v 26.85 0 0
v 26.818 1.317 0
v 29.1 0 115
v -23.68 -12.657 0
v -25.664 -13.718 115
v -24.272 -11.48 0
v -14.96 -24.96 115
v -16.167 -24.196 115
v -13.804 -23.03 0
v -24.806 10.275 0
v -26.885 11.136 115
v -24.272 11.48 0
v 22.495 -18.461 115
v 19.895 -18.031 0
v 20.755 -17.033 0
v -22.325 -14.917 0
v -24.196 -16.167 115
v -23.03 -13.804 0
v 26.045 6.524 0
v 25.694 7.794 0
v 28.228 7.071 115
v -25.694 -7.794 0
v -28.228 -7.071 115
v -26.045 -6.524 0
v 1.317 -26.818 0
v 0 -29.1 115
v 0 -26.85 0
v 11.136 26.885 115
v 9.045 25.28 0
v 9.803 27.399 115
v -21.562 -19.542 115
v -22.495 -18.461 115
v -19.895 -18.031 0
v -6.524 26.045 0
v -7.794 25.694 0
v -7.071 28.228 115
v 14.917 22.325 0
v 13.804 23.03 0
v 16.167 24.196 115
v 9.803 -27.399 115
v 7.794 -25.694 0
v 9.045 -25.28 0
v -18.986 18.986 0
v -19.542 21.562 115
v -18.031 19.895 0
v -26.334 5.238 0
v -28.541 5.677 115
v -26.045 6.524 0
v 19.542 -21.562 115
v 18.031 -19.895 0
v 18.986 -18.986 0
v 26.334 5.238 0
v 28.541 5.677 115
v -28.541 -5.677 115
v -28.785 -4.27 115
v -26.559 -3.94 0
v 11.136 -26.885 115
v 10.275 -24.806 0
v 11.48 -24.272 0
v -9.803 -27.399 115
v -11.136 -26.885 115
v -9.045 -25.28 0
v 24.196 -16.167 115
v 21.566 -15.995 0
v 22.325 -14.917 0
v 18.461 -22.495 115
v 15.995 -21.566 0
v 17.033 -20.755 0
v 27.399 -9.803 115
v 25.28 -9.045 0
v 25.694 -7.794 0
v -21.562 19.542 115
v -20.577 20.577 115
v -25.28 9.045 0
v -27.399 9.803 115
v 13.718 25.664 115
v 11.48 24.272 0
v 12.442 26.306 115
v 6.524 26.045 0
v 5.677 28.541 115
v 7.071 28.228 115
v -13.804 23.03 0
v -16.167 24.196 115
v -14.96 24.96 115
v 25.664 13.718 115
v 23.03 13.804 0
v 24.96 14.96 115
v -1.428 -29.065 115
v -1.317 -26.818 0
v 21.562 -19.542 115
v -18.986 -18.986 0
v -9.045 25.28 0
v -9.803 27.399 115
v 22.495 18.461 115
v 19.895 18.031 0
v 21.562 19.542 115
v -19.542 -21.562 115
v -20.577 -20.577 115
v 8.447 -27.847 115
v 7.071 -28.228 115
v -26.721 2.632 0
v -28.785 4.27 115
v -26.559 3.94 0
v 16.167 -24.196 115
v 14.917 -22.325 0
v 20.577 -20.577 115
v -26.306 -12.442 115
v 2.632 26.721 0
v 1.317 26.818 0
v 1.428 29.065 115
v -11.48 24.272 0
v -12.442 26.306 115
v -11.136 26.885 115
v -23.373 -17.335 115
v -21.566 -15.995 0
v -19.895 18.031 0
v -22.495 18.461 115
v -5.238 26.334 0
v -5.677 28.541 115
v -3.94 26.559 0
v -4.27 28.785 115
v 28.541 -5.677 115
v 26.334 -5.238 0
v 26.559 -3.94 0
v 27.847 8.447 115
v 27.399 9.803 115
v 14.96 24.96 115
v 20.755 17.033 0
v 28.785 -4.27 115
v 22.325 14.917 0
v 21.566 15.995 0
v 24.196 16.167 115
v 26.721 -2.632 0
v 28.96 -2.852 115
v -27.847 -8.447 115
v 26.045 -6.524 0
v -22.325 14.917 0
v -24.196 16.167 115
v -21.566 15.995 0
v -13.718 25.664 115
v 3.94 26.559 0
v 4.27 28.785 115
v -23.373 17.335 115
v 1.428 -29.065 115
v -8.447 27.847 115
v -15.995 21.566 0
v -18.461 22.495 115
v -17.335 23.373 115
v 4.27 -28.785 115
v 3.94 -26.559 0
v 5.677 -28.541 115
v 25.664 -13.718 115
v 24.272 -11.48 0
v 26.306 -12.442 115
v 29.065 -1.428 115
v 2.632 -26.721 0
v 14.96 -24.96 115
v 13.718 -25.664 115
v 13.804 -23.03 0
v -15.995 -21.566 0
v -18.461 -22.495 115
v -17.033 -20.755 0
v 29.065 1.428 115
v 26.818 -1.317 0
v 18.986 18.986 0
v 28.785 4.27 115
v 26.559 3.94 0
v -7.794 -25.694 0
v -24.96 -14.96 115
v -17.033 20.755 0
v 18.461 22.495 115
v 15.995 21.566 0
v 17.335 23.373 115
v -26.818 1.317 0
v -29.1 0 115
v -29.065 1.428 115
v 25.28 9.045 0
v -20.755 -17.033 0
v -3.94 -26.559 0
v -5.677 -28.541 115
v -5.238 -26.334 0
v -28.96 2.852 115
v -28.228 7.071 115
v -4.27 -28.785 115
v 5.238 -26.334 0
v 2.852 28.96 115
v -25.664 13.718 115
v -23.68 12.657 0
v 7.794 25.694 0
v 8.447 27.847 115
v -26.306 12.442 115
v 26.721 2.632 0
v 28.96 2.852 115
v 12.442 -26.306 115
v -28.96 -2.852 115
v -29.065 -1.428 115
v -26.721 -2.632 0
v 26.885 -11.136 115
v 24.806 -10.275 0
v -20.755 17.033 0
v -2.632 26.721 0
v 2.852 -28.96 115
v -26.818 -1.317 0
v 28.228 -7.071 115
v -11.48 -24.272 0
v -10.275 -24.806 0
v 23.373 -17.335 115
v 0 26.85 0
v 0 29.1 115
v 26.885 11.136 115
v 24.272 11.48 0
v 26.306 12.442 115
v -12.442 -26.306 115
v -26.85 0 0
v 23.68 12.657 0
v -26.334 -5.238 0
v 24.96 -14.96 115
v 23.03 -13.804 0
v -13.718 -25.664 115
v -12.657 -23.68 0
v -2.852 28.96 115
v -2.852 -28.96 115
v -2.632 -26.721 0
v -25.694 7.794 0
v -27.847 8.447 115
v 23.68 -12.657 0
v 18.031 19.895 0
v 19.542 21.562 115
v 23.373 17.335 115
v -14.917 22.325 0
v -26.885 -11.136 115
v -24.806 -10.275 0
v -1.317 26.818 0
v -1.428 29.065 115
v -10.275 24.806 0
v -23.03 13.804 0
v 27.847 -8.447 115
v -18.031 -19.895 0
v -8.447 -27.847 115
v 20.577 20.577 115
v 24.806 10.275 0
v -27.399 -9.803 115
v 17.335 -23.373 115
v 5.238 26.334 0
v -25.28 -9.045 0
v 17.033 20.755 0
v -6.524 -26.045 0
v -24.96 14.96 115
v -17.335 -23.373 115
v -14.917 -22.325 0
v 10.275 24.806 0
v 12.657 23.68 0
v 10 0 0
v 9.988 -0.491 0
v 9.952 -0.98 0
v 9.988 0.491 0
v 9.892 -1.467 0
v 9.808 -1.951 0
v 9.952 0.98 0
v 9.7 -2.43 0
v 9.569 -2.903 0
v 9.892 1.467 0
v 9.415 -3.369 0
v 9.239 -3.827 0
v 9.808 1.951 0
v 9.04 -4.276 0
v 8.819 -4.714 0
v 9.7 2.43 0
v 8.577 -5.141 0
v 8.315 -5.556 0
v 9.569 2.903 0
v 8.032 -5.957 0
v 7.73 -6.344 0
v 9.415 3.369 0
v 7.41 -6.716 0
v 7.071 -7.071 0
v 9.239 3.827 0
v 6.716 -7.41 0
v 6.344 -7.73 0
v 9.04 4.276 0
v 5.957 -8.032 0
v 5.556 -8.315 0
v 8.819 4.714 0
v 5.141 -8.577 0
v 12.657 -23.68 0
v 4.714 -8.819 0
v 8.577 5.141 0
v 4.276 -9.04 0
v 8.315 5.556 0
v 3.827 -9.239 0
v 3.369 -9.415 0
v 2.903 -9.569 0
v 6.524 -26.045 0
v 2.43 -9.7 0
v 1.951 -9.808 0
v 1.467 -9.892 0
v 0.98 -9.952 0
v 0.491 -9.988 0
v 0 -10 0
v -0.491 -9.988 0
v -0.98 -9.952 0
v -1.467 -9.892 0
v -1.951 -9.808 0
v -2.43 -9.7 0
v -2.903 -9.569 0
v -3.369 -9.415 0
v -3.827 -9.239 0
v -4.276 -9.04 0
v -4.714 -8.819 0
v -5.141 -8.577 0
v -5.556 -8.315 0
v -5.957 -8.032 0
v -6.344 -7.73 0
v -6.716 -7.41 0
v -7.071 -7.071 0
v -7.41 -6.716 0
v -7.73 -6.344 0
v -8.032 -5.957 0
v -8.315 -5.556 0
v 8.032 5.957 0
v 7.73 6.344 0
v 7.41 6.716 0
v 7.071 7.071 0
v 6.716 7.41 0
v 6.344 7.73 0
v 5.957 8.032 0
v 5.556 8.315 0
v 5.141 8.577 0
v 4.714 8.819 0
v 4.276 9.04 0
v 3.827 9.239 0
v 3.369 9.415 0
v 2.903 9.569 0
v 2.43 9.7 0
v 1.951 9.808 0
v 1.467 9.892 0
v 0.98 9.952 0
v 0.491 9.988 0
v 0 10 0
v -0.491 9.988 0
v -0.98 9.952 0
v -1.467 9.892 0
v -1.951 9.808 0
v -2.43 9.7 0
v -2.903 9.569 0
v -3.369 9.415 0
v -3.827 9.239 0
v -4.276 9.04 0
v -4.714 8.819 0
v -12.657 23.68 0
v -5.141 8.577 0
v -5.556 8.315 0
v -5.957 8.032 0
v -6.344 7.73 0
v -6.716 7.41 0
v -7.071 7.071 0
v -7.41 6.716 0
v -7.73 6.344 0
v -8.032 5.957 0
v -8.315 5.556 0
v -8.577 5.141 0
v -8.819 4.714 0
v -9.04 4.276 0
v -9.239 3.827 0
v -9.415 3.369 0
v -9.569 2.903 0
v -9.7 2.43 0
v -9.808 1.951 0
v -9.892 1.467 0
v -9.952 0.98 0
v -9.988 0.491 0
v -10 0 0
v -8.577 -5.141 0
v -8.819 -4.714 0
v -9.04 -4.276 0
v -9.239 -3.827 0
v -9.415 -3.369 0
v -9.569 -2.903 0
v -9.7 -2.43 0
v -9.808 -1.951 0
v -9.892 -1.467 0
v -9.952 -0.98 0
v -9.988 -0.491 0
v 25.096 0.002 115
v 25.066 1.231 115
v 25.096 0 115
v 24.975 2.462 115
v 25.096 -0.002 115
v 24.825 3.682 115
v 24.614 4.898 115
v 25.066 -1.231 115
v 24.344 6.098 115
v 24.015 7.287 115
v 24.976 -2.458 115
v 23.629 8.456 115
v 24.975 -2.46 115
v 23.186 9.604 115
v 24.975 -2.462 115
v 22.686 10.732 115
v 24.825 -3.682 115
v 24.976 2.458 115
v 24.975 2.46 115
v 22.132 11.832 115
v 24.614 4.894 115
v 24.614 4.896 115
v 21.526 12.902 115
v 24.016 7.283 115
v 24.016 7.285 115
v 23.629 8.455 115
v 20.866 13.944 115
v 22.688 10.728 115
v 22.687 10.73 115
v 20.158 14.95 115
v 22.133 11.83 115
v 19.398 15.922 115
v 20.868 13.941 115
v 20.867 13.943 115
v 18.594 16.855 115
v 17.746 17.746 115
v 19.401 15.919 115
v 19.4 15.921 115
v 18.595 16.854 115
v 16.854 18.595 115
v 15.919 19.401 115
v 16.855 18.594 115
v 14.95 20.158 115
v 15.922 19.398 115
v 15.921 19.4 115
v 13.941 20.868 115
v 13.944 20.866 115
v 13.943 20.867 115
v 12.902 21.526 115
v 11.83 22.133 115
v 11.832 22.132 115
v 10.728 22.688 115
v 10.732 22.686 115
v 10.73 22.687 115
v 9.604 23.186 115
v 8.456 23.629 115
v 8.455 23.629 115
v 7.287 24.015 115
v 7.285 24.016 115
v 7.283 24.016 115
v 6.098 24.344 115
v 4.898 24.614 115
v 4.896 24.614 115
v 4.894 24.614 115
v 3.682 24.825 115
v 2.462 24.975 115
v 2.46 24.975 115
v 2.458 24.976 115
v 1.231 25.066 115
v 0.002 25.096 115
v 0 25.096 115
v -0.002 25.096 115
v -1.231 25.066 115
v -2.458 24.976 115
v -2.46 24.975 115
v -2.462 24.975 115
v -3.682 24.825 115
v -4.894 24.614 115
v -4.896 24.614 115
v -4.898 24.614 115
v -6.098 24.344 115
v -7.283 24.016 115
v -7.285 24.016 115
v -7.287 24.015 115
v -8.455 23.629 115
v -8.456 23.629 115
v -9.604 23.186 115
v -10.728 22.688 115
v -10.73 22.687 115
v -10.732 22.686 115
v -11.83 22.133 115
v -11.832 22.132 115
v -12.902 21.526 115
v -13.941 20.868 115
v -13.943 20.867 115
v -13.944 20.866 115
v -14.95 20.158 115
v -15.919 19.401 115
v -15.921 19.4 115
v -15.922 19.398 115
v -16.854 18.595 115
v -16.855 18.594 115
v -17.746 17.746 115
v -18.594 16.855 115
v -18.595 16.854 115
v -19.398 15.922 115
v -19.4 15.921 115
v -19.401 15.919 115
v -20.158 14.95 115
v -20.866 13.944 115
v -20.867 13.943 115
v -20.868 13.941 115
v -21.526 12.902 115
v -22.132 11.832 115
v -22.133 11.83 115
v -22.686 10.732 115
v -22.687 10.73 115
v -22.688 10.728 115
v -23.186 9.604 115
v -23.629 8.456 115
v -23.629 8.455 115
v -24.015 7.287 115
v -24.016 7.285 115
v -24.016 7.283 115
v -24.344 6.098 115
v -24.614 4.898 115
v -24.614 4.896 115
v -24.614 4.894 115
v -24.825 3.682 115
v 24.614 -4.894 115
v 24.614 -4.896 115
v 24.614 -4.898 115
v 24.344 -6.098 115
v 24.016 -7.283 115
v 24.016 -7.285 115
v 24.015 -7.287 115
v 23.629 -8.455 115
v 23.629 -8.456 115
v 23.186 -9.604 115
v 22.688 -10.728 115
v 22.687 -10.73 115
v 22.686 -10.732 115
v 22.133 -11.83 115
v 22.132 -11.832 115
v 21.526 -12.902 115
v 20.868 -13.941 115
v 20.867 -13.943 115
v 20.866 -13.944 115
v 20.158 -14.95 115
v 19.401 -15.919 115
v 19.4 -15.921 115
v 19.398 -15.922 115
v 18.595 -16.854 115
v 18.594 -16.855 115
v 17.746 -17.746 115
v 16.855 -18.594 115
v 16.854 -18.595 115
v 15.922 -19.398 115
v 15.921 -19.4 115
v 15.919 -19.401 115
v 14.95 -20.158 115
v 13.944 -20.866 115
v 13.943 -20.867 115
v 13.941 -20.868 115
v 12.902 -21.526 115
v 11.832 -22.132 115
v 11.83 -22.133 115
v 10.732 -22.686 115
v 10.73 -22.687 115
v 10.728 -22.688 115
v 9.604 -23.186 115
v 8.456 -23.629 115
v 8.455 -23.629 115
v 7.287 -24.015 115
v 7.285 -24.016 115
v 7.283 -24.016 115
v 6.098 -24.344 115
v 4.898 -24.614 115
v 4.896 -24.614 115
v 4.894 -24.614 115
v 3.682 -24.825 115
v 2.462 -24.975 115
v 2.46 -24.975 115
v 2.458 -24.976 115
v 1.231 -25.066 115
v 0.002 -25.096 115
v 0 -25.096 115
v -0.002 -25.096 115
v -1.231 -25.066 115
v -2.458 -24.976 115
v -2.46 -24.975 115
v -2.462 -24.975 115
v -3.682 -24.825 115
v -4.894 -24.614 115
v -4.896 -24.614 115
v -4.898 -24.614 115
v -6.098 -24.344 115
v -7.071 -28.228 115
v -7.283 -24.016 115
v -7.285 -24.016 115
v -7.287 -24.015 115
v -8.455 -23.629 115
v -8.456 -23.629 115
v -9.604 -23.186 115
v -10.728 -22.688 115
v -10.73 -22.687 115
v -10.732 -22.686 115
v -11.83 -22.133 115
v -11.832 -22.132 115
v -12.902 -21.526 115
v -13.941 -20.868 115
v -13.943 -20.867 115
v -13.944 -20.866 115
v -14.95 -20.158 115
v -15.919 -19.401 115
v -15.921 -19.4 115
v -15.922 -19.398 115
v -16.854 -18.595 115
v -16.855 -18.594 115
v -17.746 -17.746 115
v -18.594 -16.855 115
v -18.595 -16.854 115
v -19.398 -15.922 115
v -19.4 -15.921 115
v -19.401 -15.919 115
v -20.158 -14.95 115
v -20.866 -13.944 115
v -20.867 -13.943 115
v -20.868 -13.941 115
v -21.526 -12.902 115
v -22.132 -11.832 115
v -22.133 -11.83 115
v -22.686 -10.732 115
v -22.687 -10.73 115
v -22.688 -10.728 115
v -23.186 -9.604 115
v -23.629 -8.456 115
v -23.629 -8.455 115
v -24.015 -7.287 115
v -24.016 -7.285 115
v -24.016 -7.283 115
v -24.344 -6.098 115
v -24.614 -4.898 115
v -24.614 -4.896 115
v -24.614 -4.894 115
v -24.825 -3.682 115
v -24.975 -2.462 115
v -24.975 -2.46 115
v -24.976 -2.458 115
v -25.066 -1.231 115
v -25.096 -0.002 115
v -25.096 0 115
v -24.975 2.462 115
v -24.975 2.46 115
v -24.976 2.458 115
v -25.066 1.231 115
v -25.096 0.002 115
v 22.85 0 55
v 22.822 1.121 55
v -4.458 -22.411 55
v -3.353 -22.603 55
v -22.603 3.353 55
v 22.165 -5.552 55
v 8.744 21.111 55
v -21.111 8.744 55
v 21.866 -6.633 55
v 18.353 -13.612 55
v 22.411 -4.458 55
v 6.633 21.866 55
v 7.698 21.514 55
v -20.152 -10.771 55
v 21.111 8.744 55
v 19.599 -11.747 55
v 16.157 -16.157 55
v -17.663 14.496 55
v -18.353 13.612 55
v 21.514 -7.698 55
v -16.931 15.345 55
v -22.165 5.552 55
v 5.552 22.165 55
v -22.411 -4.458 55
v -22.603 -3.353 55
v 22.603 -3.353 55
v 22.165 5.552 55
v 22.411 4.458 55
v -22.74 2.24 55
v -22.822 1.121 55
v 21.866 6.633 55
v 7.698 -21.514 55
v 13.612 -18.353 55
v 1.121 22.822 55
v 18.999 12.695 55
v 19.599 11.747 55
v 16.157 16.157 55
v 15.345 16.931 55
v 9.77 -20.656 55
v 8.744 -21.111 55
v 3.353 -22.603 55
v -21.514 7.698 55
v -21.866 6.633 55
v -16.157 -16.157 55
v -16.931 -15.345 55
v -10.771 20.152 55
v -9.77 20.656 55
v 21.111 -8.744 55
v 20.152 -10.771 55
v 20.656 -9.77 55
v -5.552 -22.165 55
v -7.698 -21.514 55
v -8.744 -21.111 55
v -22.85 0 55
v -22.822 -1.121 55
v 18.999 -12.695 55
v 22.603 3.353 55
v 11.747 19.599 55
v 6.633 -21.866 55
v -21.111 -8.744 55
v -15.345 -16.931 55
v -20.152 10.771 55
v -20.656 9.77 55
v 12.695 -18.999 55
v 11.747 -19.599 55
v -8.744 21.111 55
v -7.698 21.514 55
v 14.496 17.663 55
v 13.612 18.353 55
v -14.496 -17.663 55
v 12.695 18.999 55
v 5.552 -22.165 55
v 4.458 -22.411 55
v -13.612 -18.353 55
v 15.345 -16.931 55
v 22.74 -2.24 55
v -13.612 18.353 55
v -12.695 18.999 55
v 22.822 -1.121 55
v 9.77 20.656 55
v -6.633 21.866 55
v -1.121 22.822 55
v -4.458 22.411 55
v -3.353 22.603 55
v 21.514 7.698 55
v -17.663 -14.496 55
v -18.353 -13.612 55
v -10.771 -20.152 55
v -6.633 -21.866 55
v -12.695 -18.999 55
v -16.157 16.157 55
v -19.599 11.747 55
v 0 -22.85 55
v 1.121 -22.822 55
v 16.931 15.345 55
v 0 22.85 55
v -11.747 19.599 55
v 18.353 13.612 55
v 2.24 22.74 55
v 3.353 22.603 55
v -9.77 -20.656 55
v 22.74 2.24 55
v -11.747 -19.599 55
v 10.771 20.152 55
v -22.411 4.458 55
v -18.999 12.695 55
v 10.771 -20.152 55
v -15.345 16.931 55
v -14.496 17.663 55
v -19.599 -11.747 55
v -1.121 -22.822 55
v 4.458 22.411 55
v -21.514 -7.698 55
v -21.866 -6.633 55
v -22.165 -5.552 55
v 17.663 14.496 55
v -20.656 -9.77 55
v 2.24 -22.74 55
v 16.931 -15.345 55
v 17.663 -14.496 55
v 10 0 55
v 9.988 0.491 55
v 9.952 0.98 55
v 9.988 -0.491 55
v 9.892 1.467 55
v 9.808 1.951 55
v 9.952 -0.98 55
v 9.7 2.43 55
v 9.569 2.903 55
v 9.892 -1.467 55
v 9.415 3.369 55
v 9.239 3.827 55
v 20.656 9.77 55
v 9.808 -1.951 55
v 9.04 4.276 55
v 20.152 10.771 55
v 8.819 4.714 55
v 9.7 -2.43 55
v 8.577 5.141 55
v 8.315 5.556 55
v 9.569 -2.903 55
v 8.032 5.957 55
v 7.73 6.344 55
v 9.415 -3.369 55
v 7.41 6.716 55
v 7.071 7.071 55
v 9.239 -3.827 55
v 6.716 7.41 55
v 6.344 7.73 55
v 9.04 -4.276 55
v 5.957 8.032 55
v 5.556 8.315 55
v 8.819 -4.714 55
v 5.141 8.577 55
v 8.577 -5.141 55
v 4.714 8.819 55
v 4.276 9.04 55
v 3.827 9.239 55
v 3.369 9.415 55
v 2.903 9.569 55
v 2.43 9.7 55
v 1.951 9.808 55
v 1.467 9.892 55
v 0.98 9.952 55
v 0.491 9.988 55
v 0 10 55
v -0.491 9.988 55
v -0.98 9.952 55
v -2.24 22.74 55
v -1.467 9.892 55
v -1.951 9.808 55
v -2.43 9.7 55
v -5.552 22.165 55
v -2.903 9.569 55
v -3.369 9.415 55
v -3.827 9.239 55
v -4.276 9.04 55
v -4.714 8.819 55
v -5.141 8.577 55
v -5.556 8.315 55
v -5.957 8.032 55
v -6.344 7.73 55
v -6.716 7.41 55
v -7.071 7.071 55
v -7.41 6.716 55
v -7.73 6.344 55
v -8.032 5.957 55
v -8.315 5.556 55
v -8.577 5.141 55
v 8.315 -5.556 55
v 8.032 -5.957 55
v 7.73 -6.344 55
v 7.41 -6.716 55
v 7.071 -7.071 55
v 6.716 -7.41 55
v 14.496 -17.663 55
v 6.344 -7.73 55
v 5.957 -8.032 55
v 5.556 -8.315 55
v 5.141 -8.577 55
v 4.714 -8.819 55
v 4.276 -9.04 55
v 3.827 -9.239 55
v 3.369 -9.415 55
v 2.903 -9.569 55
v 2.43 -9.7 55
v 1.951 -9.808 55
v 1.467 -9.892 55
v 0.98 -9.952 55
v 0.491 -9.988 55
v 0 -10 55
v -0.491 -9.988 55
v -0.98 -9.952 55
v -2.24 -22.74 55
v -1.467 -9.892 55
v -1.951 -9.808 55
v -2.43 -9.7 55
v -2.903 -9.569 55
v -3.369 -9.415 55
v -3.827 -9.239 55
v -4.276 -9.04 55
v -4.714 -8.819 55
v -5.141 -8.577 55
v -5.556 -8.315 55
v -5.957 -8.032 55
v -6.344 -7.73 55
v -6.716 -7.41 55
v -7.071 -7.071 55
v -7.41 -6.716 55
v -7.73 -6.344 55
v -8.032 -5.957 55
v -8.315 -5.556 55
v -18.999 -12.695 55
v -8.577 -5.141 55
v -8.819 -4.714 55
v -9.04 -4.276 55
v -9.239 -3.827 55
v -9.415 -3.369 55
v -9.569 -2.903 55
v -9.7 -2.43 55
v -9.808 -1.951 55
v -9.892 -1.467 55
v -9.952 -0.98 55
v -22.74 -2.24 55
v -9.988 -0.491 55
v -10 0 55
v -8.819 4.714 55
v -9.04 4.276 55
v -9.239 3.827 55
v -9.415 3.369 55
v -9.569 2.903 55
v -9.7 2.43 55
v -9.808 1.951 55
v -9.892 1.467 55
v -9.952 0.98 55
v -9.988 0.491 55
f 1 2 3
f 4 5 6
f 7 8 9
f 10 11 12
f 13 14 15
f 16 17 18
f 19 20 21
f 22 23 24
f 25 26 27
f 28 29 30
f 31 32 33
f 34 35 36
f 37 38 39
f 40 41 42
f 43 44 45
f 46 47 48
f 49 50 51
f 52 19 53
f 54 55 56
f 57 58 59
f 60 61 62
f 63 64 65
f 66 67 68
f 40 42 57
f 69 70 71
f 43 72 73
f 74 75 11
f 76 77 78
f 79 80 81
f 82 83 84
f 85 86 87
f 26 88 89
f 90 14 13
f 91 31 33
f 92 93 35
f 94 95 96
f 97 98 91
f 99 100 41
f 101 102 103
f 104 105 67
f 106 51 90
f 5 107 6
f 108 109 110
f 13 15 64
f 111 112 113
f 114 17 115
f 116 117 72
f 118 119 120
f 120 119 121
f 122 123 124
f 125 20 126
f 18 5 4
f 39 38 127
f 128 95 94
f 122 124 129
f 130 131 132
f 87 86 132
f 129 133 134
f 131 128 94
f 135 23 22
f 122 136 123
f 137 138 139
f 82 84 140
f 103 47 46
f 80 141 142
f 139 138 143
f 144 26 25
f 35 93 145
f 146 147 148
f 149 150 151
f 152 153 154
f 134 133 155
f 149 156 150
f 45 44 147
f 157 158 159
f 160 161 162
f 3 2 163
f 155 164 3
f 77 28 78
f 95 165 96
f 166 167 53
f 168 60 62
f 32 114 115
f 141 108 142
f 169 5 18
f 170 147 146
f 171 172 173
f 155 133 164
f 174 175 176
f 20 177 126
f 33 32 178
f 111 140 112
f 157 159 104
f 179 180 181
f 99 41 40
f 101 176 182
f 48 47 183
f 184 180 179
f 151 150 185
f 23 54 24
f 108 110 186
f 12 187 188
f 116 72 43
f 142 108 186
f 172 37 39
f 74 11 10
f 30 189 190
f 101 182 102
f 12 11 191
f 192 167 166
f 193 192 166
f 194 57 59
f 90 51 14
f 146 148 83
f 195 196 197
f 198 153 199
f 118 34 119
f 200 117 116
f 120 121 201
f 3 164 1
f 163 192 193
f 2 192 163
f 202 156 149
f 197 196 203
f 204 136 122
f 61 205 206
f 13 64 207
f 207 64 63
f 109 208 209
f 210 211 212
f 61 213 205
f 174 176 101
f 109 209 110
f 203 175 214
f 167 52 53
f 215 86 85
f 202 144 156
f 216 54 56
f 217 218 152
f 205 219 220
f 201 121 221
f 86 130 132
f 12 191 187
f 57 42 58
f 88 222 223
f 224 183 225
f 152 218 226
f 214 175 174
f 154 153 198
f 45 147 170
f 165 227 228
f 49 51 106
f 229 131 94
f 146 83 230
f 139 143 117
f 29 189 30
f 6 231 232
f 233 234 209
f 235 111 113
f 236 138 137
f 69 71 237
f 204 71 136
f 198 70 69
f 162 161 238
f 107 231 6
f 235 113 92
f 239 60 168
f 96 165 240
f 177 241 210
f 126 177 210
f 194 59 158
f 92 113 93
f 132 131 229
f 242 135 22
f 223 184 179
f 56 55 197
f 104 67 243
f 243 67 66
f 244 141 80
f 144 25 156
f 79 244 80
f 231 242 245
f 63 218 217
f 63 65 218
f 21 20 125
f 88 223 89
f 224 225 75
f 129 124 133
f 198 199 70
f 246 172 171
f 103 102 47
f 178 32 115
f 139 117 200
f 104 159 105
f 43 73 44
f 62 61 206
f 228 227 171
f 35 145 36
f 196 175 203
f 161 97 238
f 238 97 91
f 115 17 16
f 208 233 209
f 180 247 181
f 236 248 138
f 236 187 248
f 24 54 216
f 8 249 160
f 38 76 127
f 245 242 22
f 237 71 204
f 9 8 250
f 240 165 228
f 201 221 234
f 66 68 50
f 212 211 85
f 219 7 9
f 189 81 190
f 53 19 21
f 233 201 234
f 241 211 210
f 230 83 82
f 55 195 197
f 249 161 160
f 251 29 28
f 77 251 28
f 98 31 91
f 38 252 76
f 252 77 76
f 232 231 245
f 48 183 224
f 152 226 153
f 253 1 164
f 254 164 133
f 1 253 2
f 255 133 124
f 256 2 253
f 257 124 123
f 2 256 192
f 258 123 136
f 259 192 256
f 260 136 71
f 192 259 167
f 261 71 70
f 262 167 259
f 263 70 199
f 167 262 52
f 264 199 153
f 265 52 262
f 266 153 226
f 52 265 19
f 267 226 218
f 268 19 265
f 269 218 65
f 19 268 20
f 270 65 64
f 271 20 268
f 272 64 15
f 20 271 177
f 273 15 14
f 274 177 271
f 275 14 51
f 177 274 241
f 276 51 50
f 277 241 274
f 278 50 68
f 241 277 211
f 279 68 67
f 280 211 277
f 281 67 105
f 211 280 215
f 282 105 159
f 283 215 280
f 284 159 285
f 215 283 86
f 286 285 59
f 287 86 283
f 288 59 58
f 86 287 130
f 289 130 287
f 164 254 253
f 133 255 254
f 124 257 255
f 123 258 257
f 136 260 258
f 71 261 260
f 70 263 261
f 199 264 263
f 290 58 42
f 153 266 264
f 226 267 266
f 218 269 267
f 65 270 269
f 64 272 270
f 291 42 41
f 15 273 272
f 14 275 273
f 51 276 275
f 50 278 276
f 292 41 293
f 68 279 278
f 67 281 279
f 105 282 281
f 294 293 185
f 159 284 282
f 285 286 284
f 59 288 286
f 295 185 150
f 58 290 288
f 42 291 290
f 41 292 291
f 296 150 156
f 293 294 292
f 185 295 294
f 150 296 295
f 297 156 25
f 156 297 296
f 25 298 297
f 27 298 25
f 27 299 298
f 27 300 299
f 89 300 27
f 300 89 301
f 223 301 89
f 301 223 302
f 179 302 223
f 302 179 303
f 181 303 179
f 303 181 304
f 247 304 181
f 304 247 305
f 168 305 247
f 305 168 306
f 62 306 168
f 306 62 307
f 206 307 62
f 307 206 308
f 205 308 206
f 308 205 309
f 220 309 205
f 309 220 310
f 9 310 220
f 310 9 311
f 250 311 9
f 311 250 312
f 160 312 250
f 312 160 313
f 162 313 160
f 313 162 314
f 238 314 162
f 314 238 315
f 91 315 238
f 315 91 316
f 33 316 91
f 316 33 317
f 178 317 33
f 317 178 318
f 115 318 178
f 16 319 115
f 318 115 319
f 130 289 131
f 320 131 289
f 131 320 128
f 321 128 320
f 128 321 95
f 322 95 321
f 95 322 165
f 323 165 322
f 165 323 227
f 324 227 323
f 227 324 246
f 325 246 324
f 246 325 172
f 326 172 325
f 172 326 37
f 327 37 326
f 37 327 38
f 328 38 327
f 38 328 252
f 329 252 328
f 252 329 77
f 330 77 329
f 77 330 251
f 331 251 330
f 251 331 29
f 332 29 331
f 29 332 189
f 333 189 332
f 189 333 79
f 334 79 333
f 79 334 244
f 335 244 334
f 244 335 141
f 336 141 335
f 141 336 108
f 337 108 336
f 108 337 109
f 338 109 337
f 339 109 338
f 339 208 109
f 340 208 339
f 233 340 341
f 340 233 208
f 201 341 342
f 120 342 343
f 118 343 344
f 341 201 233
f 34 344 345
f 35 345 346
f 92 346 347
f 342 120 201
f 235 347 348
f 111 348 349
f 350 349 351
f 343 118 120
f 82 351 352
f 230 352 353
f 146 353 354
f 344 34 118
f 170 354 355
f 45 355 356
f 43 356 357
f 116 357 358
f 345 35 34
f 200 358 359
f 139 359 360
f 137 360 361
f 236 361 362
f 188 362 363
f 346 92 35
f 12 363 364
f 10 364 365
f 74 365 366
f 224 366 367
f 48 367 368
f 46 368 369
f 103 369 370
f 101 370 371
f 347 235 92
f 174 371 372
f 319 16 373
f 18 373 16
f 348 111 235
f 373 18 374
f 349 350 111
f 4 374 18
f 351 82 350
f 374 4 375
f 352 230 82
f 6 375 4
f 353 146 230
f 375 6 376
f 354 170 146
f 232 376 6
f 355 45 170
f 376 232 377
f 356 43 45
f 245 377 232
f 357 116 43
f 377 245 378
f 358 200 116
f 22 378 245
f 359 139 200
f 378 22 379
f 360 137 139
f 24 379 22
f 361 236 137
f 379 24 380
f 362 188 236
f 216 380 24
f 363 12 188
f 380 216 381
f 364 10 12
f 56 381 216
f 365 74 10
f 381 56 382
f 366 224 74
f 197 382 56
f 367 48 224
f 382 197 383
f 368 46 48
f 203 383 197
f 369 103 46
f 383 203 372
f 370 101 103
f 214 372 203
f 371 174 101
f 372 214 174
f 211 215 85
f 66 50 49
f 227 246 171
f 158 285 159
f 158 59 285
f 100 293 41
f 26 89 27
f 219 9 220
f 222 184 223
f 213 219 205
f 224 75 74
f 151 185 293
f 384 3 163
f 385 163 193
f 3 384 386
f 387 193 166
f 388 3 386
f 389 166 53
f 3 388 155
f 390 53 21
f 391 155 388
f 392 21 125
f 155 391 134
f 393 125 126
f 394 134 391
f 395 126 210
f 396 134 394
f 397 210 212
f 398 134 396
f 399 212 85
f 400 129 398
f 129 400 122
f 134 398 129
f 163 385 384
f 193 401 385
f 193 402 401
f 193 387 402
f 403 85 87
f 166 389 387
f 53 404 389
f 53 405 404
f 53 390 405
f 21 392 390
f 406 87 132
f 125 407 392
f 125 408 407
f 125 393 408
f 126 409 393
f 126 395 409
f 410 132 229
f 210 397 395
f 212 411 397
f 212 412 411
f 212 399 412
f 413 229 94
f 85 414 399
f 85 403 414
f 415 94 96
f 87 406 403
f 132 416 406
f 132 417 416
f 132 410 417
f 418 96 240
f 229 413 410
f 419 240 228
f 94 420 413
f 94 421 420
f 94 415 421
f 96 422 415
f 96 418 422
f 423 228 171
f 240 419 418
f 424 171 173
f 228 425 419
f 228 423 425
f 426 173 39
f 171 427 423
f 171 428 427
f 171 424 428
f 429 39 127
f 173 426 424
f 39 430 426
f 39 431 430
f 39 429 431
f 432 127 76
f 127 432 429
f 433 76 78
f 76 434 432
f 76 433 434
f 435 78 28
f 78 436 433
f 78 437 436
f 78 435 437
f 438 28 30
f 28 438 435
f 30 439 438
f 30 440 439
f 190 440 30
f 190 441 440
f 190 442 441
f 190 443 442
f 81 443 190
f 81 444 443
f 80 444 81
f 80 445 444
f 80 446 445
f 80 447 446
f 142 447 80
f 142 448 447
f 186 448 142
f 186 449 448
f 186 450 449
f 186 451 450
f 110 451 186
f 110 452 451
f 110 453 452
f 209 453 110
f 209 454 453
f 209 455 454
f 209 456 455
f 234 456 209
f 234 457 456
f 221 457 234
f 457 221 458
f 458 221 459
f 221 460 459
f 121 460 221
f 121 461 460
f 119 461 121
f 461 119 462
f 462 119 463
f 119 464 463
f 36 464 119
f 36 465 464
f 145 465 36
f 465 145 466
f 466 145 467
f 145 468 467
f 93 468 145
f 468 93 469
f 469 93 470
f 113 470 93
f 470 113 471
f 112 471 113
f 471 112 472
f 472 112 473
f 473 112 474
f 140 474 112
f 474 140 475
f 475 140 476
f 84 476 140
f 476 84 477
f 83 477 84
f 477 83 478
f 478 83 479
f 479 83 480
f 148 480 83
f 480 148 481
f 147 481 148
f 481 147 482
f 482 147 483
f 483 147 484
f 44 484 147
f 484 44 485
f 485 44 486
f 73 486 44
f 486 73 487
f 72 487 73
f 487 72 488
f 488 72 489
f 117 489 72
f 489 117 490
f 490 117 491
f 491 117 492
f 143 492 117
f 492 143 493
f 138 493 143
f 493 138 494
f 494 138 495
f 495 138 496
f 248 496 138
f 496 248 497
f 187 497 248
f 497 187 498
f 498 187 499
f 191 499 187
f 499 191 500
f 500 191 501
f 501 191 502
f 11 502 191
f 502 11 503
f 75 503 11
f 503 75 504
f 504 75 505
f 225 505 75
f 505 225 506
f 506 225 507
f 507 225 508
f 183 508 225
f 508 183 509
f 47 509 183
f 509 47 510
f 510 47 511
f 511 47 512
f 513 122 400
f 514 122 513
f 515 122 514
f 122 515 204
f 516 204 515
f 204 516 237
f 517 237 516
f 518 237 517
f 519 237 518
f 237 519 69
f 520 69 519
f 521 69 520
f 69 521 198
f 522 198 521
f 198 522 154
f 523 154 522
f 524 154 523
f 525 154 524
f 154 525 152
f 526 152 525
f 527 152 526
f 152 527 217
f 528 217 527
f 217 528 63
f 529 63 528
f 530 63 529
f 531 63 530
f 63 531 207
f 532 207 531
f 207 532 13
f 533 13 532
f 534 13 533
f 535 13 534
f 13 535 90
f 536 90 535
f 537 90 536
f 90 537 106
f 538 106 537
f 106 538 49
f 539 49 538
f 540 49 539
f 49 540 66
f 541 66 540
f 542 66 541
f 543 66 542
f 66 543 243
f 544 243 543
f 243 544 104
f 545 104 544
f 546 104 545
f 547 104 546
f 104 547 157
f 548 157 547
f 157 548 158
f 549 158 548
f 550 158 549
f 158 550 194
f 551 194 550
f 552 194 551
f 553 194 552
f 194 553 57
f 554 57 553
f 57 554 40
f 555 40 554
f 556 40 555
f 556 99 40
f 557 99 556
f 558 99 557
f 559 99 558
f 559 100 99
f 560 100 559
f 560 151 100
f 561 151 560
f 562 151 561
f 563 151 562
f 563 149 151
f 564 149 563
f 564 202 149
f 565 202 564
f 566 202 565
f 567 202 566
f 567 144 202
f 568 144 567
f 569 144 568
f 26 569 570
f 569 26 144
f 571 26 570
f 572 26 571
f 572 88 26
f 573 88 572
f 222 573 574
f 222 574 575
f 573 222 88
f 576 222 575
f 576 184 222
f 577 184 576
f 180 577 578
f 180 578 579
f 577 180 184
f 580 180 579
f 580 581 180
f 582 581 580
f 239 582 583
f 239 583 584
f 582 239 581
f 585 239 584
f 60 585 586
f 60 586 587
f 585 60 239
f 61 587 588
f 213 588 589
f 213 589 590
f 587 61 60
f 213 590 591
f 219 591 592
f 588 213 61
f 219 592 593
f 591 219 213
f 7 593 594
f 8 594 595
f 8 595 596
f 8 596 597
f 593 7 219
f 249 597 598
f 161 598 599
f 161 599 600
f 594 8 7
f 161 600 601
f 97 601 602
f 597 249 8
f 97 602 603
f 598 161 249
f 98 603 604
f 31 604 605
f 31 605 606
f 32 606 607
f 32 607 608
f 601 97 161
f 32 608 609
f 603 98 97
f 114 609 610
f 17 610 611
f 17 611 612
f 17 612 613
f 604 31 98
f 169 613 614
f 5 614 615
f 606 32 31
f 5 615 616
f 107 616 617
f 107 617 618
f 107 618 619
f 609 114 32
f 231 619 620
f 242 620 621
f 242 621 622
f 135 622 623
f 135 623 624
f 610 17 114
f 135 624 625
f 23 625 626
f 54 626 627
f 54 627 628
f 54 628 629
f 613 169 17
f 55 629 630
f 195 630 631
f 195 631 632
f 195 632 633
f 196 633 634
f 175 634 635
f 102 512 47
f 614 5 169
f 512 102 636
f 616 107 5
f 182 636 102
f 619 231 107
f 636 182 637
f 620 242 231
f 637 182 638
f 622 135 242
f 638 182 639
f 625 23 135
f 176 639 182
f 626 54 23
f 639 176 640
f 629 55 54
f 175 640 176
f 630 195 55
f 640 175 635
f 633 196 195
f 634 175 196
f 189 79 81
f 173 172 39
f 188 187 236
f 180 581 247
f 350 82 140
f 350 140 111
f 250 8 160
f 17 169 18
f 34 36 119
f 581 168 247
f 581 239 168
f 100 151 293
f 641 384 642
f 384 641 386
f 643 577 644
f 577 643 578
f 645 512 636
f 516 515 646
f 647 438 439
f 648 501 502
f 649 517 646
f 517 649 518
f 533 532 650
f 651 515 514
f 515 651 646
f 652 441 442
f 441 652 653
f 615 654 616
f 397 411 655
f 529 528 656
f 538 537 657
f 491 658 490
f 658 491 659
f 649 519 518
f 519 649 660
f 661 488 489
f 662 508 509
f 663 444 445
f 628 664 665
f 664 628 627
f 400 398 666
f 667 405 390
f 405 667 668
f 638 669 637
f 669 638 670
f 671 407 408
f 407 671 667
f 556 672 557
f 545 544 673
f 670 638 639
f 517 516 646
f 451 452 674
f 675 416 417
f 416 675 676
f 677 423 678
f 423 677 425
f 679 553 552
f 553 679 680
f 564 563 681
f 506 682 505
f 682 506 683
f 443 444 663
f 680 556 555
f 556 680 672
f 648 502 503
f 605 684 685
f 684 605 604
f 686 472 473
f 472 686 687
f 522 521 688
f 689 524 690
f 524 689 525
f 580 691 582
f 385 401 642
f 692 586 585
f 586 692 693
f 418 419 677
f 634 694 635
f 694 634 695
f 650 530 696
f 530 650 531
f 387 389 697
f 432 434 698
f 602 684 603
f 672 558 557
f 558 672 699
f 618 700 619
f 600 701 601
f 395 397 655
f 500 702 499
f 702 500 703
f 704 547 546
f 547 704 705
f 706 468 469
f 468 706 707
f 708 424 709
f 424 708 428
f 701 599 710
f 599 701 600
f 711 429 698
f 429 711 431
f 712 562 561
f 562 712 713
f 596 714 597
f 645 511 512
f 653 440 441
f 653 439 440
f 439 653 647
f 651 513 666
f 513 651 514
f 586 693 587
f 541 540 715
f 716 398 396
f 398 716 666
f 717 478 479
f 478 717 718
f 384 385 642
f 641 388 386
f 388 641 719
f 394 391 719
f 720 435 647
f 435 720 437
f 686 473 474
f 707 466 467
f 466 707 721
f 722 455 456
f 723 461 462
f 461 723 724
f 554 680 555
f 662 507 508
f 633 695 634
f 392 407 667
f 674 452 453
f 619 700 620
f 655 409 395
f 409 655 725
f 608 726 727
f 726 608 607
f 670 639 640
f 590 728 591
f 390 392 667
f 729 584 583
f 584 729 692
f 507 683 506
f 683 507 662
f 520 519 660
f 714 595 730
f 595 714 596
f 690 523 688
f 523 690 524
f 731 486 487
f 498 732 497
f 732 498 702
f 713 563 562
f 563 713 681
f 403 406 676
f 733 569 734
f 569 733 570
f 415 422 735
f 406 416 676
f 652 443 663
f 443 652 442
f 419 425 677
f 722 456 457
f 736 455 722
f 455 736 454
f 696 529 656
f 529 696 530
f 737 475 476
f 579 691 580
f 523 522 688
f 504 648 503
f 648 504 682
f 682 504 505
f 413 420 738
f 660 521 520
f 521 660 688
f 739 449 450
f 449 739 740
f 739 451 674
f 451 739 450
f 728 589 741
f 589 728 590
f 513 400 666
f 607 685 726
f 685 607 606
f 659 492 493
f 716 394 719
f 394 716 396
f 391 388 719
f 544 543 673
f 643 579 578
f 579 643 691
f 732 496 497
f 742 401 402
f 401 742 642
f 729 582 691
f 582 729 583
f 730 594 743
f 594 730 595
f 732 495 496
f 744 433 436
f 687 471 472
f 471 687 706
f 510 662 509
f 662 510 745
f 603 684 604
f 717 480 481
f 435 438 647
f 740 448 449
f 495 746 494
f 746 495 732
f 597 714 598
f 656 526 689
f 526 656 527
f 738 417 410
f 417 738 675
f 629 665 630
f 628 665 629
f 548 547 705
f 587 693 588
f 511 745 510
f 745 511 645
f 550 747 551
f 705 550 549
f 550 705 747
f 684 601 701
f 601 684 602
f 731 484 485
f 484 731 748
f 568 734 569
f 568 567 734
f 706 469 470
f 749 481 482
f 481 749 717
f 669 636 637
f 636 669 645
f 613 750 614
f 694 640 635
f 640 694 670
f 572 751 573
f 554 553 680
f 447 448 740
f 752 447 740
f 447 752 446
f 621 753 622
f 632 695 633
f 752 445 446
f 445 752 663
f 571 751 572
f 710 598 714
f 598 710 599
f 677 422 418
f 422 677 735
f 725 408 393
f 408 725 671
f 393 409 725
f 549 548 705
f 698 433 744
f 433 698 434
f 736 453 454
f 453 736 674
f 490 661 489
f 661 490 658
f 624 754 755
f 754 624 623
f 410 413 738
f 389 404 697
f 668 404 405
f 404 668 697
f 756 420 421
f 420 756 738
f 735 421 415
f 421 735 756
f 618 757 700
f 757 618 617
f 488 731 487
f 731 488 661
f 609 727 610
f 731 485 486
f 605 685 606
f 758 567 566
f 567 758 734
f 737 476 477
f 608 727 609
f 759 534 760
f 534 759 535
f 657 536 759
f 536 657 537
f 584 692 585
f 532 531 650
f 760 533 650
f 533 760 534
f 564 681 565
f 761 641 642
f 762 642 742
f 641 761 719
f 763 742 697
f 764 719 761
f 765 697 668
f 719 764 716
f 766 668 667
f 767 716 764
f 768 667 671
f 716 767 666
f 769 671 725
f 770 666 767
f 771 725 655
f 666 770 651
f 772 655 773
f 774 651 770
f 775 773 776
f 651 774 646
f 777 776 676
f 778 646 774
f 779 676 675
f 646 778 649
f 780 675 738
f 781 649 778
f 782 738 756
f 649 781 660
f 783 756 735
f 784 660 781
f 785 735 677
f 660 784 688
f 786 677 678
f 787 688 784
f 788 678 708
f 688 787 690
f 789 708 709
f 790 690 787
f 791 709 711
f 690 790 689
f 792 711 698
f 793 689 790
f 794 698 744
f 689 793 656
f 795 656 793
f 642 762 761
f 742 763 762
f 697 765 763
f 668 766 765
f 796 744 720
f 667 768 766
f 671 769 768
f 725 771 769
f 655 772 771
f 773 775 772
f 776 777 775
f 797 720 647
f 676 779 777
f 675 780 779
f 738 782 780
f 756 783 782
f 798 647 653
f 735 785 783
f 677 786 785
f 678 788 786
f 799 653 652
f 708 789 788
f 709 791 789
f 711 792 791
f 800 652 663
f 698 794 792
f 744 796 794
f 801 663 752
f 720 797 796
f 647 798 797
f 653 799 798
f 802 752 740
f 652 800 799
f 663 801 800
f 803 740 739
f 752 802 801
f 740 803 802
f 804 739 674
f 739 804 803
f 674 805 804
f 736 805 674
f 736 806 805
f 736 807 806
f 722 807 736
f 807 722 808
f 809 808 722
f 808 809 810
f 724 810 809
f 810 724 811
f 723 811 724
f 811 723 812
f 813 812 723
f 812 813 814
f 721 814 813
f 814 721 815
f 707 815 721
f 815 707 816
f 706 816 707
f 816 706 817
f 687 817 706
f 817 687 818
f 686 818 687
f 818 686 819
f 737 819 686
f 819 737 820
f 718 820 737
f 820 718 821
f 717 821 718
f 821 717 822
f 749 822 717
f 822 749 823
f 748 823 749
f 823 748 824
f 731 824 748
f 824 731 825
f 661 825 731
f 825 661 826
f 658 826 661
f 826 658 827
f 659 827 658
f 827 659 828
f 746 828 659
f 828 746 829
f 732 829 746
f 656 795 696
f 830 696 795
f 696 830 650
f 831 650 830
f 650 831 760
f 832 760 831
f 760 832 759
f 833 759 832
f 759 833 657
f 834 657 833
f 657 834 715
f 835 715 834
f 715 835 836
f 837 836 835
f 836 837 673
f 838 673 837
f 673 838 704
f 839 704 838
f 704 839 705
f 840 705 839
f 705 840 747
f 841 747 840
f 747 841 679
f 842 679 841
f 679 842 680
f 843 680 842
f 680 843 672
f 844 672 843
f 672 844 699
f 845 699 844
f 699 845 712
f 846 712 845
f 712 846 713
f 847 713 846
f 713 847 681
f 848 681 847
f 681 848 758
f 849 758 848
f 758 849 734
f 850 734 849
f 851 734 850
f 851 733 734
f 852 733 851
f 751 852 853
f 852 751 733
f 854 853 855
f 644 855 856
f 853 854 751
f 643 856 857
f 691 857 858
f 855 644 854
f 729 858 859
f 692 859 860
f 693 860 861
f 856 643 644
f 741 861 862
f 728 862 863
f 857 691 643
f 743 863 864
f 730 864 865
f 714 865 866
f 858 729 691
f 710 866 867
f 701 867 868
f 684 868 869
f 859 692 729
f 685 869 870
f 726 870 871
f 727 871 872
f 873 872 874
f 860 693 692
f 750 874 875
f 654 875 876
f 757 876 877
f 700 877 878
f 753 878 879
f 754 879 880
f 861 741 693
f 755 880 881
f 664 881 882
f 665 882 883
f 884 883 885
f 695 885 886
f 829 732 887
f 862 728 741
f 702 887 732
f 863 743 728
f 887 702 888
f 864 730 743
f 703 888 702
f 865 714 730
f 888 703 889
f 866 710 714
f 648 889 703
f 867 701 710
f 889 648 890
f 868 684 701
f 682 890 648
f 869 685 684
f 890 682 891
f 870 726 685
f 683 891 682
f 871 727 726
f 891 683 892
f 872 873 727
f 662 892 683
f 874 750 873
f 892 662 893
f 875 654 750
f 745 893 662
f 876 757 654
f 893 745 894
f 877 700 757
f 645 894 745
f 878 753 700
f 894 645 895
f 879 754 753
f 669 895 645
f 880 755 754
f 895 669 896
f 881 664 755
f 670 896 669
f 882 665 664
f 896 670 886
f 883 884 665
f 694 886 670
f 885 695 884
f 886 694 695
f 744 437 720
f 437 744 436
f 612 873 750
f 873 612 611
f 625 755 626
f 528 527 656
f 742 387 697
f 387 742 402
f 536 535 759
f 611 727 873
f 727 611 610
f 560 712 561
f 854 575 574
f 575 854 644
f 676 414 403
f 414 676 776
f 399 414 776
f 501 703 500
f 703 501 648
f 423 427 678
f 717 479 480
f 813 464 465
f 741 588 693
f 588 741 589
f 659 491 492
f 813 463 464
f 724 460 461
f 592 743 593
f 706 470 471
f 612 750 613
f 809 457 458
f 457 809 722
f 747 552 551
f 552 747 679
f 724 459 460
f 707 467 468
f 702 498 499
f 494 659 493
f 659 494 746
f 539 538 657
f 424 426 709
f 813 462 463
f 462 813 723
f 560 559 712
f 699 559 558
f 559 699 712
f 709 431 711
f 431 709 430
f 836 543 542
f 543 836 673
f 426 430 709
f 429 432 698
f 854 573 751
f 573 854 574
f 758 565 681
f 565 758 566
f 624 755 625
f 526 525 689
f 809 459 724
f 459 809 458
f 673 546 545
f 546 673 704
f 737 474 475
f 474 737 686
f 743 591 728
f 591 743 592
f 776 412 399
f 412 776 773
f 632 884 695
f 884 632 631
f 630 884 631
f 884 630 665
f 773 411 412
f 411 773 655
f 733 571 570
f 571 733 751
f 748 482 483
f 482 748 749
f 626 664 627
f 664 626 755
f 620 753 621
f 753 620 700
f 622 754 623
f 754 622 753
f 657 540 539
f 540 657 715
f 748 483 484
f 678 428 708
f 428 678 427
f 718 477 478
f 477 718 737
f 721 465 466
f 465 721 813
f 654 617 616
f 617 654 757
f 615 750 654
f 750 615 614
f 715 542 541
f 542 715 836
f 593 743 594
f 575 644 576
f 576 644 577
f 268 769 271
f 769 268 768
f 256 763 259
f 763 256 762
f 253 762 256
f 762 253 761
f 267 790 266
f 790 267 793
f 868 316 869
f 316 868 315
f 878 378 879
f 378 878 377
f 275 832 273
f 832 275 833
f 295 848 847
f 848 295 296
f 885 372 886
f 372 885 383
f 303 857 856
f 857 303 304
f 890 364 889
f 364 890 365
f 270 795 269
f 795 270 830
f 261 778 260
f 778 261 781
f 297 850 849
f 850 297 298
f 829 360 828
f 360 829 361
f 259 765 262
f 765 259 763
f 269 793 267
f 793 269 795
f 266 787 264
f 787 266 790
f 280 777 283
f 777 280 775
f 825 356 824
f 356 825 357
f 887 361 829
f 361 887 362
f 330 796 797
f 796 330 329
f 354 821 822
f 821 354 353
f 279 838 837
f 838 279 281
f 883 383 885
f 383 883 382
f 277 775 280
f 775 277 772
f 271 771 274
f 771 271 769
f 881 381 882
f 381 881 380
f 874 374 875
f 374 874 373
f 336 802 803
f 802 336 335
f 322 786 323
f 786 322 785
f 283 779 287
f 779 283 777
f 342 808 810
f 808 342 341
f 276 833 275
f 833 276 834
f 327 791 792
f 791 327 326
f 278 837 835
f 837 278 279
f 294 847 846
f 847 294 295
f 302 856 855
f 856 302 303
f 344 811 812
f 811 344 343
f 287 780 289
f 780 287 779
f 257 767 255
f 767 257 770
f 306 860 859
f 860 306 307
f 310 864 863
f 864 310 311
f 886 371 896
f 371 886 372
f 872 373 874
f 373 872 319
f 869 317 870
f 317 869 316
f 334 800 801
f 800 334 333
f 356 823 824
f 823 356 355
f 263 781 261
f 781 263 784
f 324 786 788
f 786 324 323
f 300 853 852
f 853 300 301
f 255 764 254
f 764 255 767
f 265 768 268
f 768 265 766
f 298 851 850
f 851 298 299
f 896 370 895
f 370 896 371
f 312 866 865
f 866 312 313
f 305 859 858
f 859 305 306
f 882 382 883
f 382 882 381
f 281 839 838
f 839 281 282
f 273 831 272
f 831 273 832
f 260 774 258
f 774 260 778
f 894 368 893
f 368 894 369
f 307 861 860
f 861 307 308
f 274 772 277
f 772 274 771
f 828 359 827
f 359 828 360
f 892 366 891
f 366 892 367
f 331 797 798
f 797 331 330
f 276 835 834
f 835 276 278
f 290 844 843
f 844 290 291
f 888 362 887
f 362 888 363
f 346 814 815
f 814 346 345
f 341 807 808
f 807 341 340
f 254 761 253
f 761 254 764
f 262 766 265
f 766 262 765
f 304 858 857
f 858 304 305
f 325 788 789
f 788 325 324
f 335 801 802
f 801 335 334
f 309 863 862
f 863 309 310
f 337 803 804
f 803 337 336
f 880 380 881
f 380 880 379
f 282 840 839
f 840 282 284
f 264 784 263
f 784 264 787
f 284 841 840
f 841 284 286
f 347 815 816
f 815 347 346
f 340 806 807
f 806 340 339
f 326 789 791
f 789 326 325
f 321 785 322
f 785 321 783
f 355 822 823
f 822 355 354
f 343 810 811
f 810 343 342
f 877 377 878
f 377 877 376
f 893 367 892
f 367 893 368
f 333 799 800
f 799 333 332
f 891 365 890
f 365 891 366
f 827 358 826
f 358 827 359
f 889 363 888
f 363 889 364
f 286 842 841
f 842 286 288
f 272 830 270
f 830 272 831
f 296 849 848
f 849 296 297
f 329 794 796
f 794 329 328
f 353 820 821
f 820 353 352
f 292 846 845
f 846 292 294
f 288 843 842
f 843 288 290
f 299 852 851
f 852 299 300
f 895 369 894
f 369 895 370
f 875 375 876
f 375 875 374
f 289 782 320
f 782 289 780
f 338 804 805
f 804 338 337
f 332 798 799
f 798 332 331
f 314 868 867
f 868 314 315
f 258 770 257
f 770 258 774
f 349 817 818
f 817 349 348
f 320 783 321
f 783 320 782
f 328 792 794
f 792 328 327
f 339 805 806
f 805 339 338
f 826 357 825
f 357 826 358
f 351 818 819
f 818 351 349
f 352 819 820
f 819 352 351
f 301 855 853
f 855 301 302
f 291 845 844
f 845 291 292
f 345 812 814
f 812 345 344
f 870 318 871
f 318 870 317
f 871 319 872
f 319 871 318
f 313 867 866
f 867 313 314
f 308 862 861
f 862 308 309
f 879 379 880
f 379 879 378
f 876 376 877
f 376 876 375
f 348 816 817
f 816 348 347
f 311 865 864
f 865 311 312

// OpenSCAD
$fn = $preview ? 32 : 128;

// Original leg sizes
original_leg_height = 60.1; // 6cm
original_leg_top_diameter = 50.2; // 5cm
original_leg_bottom_diameter = 45.7; // 4.5cm

// Leg extension sizes
total_height = 115; // 11.5cm
thickness = 4; // 0.4cm

module originalLeg() {
  cylinder(
    d1 = original_leg_bottom_diameter,
    d2 = original_leg_top_diameter,
    h = original_leg_height
  );
}

module legExtension() {
  difference() {
    cylinder(
      d1 = original_leg_bottom_diameter + thickness * 2,
      d2 = original_leg_top_diameter + thickness * 2,
      h = total_height
    );
    translate([
      0,
      0,
      total_height - original_leg_height + 0.1
    ]) originalLeg();

    translate([0,0,-1]) cylinder(h = total_height, d = 20);
  }
}

legExtension();
